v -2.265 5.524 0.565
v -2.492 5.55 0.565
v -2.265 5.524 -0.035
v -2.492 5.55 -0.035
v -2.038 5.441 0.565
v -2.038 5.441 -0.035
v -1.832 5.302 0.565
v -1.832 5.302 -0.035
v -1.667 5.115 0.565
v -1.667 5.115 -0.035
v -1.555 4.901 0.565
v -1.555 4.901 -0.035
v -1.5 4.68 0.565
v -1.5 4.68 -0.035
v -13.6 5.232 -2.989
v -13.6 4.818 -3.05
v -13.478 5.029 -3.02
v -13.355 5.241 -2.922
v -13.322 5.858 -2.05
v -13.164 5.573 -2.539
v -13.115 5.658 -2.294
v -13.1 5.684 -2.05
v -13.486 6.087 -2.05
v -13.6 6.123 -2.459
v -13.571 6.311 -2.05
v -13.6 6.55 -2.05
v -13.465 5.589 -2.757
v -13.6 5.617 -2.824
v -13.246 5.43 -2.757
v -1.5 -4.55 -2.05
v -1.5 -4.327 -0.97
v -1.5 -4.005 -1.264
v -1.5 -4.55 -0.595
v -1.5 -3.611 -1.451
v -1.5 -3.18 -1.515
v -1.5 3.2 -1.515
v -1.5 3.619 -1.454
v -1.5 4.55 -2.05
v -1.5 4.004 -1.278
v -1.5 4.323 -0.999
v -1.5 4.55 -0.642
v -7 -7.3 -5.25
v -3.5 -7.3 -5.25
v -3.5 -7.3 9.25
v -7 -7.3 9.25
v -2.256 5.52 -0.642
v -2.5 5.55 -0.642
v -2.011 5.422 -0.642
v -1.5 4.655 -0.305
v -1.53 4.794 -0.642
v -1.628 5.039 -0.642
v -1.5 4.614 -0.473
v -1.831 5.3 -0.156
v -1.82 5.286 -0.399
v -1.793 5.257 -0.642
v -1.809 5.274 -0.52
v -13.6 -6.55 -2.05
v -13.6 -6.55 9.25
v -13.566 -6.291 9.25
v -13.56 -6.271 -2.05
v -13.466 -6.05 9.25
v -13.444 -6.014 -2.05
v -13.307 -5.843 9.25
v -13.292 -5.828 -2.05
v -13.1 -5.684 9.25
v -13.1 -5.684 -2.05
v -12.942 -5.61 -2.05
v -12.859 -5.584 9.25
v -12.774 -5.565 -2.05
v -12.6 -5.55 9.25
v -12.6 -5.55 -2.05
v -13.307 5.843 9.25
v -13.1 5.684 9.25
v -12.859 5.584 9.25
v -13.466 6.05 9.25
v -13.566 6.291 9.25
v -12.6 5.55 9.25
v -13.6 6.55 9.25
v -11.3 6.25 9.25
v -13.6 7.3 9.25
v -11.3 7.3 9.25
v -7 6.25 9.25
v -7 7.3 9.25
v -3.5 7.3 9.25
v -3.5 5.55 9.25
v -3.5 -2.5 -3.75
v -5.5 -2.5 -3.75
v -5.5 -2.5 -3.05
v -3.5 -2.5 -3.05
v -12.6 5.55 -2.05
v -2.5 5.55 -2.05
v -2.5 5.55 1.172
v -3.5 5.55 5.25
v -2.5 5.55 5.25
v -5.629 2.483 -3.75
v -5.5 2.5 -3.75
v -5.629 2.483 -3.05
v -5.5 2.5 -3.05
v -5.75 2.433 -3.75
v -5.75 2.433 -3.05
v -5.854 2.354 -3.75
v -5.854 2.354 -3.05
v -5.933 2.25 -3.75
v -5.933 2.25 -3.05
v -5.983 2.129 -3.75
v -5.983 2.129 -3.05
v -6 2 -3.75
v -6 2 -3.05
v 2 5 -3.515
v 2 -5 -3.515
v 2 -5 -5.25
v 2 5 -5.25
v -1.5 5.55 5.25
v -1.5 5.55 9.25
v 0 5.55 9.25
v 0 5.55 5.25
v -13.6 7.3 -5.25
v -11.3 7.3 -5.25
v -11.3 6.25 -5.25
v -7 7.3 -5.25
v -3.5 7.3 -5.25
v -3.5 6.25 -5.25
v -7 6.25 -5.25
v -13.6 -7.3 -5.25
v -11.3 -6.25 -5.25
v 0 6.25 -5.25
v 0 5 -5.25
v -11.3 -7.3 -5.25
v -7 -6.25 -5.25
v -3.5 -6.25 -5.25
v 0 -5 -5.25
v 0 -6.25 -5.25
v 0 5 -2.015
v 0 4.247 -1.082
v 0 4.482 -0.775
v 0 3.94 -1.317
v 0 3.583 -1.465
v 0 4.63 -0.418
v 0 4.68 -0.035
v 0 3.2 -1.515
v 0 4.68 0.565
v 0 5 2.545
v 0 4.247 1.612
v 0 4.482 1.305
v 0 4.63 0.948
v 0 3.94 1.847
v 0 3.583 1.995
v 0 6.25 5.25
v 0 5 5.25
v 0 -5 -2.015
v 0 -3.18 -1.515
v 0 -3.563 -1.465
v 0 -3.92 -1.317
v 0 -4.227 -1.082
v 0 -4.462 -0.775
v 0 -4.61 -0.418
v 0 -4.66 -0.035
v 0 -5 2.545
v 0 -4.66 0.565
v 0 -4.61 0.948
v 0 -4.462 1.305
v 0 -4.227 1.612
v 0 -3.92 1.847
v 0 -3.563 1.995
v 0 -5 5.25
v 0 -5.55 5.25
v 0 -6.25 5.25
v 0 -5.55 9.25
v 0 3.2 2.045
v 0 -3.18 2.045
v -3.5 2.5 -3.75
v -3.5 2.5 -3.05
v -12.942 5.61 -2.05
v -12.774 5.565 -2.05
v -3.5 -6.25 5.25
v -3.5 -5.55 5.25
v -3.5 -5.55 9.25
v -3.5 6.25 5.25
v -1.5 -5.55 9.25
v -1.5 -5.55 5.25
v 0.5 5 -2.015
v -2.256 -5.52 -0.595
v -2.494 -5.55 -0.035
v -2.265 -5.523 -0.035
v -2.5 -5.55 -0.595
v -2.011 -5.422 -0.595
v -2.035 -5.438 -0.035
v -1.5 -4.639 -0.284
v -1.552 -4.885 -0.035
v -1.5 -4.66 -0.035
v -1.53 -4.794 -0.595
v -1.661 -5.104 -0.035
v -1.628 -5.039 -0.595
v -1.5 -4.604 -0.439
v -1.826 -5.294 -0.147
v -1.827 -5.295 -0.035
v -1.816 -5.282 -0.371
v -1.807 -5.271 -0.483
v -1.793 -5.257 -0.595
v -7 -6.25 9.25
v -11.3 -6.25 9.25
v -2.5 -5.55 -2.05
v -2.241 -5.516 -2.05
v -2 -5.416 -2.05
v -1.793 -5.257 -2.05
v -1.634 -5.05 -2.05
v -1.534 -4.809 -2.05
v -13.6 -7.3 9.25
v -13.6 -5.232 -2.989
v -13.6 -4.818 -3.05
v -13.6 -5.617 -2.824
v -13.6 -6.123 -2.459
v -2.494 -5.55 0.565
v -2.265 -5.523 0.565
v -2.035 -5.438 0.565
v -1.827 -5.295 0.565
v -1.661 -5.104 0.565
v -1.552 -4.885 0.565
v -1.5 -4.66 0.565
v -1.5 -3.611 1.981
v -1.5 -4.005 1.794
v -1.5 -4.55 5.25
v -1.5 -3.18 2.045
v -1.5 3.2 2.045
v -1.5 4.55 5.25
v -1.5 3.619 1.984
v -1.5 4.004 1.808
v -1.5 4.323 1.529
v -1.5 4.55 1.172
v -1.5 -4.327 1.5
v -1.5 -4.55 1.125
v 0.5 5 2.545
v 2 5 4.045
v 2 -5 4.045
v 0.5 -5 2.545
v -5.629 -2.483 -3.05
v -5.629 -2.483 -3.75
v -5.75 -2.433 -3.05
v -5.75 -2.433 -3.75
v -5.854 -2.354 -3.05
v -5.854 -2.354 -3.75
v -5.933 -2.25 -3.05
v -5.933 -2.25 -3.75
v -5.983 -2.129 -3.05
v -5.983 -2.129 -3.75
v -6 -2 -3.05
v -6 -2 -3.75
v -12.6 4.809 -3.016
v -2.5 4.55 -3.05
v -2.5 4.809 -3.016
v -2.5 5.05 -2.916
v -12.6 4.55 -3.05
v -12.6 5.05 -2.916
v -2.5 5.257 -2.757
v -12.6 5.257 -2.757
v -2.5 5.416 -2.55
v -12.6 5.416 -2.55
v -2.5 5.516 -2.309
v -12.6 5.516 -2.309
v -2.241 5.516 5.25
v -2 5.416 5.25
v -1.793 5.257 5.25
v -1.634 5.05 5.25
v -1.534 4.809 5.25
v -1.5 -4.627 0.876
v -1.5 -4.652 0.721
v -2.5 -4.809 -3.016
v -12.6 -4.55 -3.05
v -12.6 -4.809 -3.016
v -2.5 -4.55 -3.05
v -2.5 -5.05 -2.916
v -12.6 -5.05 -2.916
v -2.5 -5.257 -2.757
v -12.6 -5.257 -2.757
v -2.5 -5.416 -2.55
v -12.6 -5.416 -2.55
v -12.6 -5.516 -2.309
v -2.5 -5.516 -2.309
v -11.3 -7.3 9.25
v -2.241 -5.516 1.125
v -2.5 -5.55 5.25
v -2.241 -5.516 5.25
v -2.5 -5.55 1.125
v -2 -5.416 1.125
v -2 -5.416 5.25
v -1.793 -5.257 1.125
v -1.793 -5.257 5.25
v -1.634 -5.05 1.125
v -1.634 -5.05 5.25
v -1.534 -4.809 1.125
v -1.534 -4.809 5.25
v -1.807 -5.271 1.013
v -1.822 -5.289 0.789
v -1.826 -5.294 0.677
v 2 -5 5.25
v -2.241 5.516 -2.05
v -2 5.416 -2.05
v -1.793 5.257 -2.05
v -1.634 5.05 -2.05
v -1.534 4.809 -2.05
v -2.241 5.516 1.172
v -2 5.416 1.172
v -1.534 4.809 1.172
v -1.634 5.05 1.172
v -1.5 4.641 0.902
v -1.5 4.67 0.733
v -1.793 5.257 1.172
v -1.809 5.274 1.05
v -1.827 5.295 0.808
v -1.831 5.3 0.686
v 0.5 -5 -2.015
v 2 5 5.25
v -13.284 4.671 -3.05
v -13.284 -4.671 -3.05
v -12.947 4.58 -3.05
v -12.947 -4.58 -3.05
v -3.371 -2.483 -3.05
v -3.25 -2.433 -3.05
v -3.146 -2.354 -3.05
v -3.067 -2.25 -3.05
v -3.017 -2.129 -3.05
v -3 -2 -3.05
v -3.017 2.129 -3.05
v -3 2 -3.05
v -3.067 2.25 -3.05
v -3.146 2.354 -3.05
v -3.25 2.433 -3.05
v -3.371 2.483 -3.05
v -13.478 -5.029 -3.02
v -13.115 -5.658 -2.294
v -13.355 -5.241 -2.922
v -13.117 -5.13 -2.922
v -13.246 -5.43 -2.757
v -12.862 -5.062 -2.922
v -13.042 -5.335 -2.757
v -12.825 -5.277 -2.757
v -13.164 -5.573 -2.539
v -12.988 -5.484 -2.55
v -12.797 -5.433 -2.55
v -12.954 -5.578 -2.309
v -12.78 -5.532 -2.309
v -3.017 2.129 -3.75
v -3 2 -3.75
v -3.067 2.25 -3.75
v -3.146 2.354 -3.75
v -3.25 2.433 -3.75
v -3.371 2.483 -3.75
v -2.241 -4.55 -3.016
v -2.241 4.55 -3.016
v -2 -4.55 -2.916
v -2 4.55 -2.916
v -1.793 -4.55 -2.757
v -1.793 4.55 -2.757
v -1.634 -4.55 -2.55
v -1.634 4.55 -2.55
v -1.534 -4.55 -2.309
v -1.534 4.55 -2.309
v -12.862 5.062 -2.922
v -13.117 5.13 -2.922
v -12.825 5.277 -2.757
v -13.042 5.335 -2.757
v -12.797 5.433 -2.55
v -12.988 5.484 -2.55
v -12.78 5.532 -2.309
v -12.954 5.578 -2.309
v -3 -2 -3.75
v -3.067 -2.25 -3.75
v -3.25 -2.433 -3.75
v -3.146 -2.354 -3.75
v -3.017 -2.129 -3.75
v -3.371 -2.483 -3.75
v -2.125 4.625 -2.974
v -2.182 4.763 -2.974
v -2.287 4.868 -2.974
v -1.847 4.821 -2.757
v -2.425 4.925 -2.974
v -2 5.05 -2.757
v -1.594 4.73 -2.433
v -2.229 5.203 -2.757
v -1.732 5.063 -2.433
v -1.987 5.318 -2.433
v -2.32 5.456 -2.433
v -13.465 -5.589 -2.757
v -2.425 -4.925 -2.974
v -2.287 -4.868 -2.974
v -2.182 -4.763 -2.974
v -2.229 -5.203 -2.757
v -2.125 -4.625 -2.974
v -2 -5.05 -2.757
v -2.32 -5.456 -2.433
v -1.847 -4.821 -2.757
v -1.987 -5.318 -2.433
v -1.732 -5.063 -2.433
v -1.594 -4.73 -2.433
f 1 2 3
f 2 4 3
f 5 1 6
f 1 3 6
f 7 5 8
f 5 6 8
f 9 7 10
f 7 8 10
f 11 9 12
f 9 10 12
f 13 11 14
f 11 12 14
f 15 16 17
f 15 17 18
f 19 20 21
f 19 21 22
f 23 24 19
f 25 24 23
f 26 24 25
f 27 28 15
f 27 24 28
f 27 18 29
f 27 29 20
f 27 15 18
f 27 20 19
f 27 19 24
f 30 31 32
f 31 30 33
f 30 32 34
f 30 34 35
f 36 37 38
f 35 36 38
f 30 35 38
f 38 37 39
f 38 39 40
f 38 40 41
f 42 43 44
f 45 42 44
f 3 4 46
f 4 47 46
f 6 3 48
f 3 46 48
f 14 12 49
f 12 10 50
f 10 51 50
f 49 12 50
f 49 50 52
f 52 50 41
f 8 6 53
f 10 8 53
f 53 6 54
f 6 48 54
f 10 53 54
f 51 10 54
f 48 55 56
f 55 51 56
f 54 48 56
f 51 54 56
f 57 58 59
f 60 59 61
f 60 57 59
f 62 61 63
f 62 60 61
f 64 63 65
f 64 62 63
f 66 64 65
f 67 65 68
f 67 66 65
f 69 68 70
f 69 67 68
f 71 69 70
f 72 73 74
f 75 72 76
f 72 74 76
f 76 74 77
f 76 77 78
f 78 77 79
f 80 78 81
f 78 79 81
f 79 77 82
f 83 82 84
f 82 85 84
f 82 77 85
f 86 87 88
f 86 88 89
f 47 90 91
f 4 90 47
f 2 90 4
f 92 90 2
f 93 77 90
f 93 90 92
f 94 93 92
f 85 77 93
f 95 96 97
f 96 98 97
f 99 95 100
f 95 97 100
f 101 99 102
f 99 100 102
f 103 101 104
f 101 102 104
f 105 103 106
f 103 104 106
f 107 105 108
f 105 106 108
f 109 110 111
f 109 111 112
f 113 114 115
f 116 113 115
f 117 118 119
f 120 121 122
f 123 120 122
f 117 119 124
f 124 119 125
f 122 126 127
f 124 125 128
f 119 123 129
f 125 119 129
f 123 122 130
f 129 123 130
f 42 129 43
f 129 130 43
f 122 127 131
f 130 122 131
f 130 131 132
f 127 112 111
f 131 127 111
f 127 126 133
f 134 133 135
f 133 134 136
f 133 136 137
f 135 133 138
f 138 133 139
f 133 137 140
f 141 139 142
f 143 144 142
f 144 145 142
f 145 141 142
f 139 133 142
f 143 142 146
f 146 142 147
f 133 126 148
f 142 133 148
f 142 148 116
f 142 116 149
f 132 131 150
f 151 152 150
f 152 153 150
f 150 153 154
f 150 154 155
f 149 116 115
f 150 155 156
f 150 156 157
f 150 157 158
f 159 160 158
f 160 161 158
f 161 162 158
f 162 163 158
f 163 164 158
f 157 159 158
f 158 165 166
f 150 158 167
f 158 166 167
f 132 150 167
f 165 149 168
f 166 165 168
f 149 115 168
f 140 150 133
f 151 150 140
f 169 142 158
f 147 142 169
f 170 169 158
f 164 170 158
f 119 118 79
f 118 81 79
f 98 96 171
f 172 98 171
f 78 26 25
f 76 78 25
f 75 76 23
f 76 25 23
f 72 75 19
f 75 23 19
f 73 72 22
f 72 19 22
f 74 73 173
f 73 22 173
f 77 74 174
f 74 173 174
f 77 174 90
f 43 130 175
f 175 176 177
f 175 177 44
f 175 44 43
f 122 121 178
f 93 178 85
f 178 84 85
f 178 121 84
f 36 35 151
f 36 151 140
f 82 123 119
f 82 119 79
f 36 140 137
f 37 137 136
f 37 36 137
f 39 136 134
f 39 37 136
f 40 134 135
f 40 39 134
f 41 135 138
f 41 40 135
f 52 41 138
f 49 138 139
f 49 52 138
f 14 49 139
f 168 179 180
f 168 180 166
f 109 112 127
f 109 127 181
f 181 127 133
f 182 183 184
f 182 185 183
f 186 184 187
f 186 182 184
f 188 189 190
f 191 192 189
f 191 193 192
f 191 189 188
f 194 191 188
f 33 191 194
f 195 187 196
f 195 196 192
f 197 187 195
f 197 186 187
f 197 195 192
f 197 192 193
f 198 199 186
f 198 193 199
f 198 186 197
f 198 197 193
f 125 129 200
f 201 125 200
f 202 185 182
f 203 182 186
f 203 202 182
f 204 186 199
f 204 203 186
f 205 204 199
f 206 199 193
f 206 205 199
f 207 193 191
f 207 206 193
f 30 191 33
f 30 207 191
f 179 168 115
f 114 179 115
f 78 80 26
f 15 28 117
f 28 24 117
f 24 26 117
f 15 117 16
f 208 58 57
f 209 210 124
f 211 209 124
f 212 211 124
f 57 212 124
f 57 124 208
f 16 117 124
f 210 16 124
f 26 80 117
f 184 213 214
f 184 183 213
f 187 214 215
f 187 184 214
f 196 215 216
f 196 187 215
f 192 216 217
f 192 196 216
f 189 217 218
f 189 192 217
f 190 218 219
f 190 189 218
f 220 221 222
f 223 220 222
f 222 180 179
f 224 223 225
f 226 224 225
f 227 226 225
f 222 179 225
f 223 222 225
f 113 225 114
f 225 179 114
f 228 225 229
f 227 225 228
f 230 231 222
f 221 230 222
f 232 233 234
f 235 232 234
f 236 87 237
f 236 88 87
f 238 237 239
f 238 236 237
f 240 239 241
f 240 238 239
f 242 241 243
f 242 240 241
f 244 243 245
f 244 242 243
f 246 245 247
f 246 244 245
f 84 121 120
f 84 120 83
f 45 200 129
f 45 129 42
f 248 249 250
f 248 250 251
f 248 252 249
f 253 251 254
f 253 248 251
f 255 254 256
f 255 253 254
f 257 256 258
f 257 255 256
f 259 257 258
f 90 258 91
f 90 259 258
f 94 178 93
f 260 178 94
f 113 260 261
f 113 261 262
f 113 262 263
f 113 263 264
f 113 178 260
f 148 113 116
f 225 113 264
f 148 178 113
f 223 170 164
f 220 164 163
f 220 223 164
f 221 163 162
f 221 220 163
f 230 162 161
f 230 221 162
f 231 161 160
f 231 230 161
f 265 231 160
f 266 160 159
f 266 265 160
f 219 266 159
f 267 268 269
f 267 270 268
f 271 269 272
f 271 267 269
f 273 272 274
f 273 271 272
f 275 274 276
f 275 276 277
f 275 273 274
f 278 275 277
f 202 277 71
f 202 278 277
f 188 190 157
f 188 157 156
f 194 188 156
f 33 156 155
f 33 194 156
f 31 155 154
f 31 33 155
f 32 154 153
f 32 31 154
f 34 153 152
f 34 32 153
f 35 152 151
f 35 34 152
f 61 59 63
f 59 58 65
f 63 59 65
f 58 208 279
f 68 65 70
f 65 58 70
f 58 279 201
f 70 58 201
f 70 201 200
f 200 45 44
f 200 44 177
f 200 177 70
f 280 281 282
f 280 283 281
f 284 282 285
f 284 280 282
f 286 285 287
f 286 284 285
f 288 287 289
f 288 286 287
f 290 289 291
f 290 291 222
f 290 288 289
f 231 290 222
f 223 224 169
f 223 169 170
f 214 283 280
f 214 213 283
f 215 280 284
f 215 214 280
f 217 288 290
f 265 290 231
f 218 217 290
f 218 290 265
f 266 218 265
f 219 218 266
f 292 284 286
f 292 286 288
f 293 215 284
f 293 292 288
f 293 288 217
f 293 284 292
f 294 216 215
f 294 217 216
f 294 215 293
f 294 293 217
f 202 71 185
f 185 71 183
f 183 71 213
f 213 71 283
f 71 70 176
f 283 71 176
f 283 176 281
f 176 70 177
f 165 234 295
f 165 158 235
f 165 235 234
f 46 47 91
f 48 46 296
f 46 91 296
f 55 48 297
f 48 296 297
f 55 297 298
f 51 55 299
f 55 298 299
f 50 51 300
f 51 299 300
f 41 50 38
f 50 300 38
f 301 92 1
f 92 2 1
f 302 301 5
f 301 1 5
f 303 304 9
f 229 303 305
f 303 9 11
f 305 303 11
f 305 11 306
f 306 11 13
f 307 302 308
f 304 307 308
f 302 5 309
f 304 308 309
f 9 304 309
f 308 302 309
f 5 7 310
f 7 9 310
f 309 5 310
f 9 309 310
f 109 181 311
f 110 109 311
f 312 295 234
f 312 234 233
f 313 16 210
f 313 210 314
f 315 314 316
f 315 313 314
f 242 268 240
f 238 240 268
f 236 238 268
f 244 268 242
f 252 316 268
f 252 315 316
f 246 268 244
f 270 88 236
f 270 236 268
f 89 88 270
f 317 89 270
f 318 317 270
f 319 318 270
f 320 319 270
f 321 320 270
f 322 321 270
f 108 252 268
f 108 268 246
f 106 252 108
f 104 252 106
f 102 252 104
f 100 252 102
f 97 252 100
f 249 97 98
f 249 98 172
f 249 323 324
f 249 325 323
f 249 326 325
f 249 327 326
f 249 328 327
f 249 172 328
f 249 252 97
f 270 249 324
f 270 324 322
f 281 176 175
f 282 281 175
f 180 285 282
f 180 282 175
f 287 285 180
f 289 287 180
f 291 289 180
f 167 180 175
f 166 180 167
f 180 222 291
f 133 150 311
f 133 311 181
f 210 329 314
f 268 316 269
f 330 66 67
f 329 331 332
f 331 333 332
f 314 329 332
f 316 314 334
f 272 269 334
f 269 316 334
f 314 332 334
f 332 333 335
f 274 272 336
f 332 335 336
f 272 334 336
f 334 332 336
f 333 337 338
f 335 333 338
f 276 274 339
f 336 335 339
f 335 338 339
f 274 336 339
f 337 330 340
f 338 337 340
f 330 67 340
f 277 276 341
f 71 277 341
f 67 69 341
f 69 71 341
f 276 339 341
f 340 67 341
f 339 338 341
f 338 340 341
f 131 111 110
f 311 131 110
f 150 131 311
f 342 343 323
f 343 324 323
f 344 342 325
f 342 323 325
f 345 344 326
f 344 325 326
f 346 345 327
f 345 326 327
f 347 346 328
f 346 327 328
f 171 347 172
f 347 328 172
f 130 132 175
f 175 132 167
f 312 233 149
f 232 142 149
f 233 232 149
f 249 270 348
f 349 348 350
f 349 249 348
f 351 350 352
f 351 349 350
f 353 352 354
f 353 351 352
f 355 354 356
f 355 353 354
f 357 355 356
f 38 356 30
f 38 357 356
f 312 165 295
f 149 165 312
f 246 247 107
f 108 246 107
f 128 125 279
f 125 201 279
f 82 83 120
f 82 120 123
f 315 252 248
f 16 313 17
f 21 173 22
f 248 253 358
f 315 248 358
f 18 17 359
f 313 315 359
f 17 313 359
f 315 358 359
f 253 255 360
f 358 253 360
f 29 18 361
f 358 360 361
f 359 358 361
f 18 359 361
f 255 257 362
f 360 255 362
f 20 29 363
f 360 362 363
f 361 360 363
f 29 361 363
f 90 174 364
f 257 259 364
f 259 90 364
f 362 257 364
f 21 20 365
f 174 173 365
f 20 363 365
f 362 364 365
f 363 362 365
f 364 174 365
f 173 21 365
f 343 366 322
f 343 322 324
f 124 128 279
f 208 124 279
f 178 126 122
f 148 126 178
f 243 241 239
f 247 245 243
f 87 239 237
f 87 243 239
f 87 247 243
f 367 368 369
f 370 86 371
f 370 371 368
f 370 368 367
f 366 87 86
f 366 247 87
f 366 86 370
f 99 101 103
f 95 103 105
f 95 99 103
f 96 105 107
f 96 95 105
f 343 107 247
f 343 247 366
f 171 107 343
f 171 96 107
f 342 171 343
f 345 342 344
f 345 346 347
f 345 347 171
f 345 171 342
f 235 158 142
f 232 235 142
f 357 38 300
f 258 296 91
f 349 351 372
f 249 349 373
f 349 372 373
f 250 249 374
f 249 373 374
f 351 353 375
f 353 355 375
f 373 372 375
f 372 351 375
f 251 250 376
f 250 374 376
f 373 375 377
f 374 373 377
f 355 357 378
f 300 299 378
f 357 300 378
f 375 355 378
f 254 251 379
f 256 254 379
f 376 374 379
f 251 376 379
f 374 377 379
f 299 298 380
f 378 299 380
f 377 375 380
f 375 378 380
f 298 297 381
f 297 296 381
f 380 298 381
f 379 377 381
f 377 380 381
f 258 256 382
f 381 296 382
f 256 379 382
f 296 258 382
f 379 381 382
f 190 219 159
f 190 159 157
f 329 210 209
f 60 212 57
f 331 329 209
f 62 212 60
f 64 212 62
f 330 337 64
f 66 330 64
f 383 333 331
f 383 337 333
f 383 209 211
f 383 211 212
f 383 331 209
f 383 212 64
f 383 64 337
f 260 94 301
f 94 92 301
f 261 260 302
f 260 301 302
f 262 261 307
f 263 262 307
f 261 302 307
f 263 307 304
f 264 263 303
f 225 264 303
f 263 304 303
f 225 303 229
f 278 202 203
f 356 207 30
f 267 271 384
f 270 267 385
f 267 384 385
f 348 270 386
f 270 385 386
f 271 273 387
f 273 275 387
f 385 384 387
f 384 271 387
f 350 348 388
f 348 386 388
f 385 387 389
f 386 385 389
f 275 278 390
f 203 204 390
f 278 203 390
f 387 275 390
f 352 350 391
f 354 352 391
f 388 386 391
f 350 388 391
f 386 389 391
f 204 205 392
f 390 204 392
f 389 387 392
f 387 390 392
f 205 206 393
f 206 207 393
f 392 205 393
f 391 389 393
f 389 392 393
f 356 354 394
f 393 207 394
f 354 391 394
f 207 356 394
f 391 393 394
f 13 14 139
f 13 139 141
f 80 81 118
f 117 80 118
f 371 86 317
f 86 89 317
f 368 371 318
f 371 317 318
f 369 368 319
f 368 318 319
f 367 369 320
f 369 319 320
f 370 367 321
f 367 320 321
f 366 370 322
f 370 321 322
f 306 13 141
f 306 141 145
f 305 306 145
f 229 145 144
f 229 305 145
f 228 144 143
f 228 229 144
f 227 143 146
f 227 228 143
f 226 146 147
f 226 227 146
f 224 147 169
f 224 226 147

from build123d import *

# Parameters (mm, degrees)
SKETCH2_W                = 10
SKETCH2_H                = 10.5
BOSS_EXTRUDE1_DEPTH      = 2
SKETCH3_W                = 12.5
SKETCH3_H                = 14.5
BOSS_EXTRUDE2_DEPTH      = 3.5
SKETCH4_W                = 14.6
SKETCH4_H                = 14.5
BOSS_EXTRUDE3_DEPTH      = 3.5
SKETCH5_W                = 12.5
SKETCH5_H                = 14.5
BOSS_EXTRUDE4_DEPTH      = 4.3
BOSS_EXTRUDE5_DEPTH      = 2.3
SKETCH8_W                = 12.1
SKETCH8_H                = 11.1
CUT_EXTRUDE1_DEPTH       = 13
SKETCH10_W               = 3.5
SKETCH10_H               = 0.7
CUT_EXTRUDE6_DEPTH       = 4
FILLET1_R                = 1
CUT_EXTRUDE9_DEPTH       = 18.994790913
CUT_EXTRUDE9_DEPTH_BACK  = 18.994790913
SKETCH15_W               = 3
SKETCH15_H               = 5
BOSS_EXTRUDE6_DEPTH      = 0.7
FILLET5_R                = 0.5
FILLET3_R                = 1
FILLET4_R                = 1
CUT_EXTRUDE10_DEPTH      = 20.550255917
CUT_EXTRUDE10_DEPTH_BACK = 2
SKETCH14_W               = 4.56
SKETCH14_H               = 10
CHAMFER4_SIZE            = 1.5


with BuildPart() as part:
    # Sketch2 → Boss-Extrude1 (new body)
    with BuildSketch(Plane.YZ):
        Rectangle(SKETCH2_W, SKETCH2_H)
    extrude(amount=BOSS_EXTRUDE1_DEPTH)

    # Sketch3 → Boss-Extrude2 (add)
    with BuildSketch(Plane(origin=(0, 0, 0), x_dir=(0, -1, 0), z_dir=(-1, 0, 0))):
        with Locations((0, 2)):
            Rectangle(SKETCH3_W, SKETCH3_H)
    extrude(amount=BOSS_EXTRUDE2_DEPTH)

    # Sketch4 → Boss-Extrude3 (add)
    with BuildSketch(Plane(origin=(-3.5, 0, 0), x_dir=(0, -1, 0), z_dir=(-1, 0, 0))):
        with Locations((0, 2)):
            Rectangle(SKETCH4_W, SKETCH4_H)
    extrude(amount=BOSS_EXTRUDE3_DEPTH)

    # Sketch5 → Boss-Extrude4 (add)
    with BuildSketch(Plane(origin=(-7, 0, 0), x_dir=(0, -1, 0), z_dir=(-1, 0, 0))):
        with Locations((0, 2)):
            Rectangle(SKETCH5_W, SKETCH5_H)
    extrude(amount=BOSS_EXTRUDE4_DEPTH)

    # Sketch6 → Boss-Extrude5 (add)
    with BuildSketch(Plane(origin=(-11.3, 0, 0), x_dir=(0, -1, 0), z_dir=(-1, 0, 0))):
        Polygon((6.25, -5.25), (7.3, -5.25), (7.3, 9.25), (6.25, 9.25), (-6.25, 9.25), (-7.3, 9.25), (-7.3, -5.25), (-6.25, -5.25), align=None)
    extrude(amount=BOSS_EXTRUDE5_DEPTH)

    # Sketch8 → Cut-Extrude1 (cut)
    with BuildSketch(Plane.XY.offset(9.25)):
        with Locations((-7.55, 0)):
            Rectangle(SKETCH8_W, SKETCH8_H)
    extrude(amount=-CUT_EXTRUDE1_DEPTH, mode=Mode.SUBTRACT)

    # Sketch10 → Cut-Extrude6 (cut)
    with BuildSketch(Plane.XY.offset(9.25)):
        with Locations((-1.75, 5.9)):
            Rectangle(SKETCH10_W, SKETCH10_H)
        with Locations((-1.75, -5.9)):
            Rectangle(SKETCH10_W, SKETCH10_H)
    extrude(amount=-CUT_EXTRUDE6_DEPTH, mode=Mode.SUBTRACT)

    # Fillet1
    fillet1_edges = [part.edges().sort_by_distance(p)[0] for p in [
        (-13.6, -5.55, 2.75),
        (-13.6, 5.55, 2.75),
    ]]
    fillet(fillet1_edges, radius=FILLET1_R)

    # Sketch13 → Cut-Extrude9 (cut, two sides: drawn at the far end of the back side and taken through both)
    with BuildSketch(Plane(origin=(0, 0, 0), x_dir=(0, 0, -1), z_dir=(1, 0, 0)).offset(-CUT_EXTRUDE9_DEPTH_BACK)):
        with BuildLine():
            Line((-2.045, 0.01001), (-2.045, -3.17999))
            ThreePointArc((-2.045, -3.17999), (-1.611518036, -4.226508036), (-0.565, -4.65999))
            Line((-0.565, -4.65999), (0.035, -4.65999))
            ThreePointArc((0.035, -4.65999), (1.081518036, -4.226508036), (1.515, -3.17999))
            Line((1.515, -3.17999), (1.515, 0.01001))
            Line((1.515, 0.01001), (1.515, 3.20001))
            ThreePointArc((1.515, 3.20001), (1.081518036, 4.246528036), (0.035, 4.68001))
            Line((0.035, 4.68001), (-0.565, 4.68001))
            ThreePointArc((-0.565, 4.68001), (-1.611518036, 4.246528036), (-2.045, 3.20001))
            Line((-2.045, 3.20001), (-2.045, 0.01001))
        make_face()
    extrude(amount=CUT_EXTRUDE9_DEPTH + CUT_EXTRUDE9_DEPTH_BACK, mode=Mode.SUBTRACT)

    # Sketch15 → Boss-Extrude6 (add)
    with BuildSketch(Plane.XY.offset(-3.75)):
        with BuildLine():
            Line((-13.6, 6.55), (-13.6, -6.55))
            ThreePointArc((-13.6, -6.55), (-13.307106781, -5.842893219), (-12.6, -5.55))
            Line((-12.6, -5.55), (-1.5, -5.55))
            Line((-1.5, -5.55), (-1.5, 5.55))
            Line((-1.5, 5.55), (-12.6, 5.55))
            ThreePointArc((-12.6, 5.55), (-13.307106781, 5.842893219), (-13.6, 6.55))
        make_face()
        with Locations((-4.5, 0)):
            Rectangle(SKETCH15_W, SKETCH15_H, mode=Mode.SUBTRACT)
    extrude(amount=BOSS_EXTRUDE6_DEPTH)

    # Fillet5
    fillet5_edges = [part.edges().sort_by_distance(p)[0] for p in [
        (-3, 2.5, -3.4),
        (-6, 2.5, -3.4),
        (-6, -2.5, -3.4),
        (-3, -2.5, -3.4),
    ]]
    fillet(fillet5_edges, radius=FILLET5_R)

    # Fillet3
    fillet3_edges = [part.edges().sort_by_distance(p)[0] for p in [
        (-1.5, -5.55, 1.1),
        (-1.5, 5.55, 1.1),
    ]]
    fillet(fillet3_edges, radius=FILLET3_R)

    # Fillet4
    fillet4_edges = [part.edges().sort_by_distance(p)[0] for p in [
        (-13.307106781, 5.842893219, -3.05),
        (-13.307106781, -5.842893219, -3.05),
        (-7.55, -5.55, -3.05),
        (-7.55, 5.55, -3.05),
        (-1.5, 0, -3.05),
        (-1.792893219, -5.257106781, -3.05),
        (-1.792893219, 5.257106781, -3.05),
    ]]
    fillet(fillet4_edges, radius=FILLET4_R)

    # Sketch14 → Cut-Extrude10 (cut, two sides: drawn at the far end of the back side and taken through both)
    with BuildSketch(Plane(origin=(2, 0, 0), x_dir=(0, 0, -1), z_dir=(1, 0, 0)).offset(-CUT_EXTRUDE10_DEPTH_BACK)):
        with Locations((-0.265, 0)):
            Rectangle(SKETCH14_W, SKETCH14_H)
    extrude(amount=CUT_EXTRUDE10_DEPTH + CUT_EXTRUDE10_DEPTH_BACK, mode=Mode.SUBTRACT)

    # Chamfer4
    chamfer4_edges = [part.edges().sort_by_distance(p)[0] for p in [
        (2, 0, 2.545),
        (2, 0, -2.015),
    ]]
    chamfer(chamfer4_edges, length=CHAMFER4_SIZE)


solid = part.part
